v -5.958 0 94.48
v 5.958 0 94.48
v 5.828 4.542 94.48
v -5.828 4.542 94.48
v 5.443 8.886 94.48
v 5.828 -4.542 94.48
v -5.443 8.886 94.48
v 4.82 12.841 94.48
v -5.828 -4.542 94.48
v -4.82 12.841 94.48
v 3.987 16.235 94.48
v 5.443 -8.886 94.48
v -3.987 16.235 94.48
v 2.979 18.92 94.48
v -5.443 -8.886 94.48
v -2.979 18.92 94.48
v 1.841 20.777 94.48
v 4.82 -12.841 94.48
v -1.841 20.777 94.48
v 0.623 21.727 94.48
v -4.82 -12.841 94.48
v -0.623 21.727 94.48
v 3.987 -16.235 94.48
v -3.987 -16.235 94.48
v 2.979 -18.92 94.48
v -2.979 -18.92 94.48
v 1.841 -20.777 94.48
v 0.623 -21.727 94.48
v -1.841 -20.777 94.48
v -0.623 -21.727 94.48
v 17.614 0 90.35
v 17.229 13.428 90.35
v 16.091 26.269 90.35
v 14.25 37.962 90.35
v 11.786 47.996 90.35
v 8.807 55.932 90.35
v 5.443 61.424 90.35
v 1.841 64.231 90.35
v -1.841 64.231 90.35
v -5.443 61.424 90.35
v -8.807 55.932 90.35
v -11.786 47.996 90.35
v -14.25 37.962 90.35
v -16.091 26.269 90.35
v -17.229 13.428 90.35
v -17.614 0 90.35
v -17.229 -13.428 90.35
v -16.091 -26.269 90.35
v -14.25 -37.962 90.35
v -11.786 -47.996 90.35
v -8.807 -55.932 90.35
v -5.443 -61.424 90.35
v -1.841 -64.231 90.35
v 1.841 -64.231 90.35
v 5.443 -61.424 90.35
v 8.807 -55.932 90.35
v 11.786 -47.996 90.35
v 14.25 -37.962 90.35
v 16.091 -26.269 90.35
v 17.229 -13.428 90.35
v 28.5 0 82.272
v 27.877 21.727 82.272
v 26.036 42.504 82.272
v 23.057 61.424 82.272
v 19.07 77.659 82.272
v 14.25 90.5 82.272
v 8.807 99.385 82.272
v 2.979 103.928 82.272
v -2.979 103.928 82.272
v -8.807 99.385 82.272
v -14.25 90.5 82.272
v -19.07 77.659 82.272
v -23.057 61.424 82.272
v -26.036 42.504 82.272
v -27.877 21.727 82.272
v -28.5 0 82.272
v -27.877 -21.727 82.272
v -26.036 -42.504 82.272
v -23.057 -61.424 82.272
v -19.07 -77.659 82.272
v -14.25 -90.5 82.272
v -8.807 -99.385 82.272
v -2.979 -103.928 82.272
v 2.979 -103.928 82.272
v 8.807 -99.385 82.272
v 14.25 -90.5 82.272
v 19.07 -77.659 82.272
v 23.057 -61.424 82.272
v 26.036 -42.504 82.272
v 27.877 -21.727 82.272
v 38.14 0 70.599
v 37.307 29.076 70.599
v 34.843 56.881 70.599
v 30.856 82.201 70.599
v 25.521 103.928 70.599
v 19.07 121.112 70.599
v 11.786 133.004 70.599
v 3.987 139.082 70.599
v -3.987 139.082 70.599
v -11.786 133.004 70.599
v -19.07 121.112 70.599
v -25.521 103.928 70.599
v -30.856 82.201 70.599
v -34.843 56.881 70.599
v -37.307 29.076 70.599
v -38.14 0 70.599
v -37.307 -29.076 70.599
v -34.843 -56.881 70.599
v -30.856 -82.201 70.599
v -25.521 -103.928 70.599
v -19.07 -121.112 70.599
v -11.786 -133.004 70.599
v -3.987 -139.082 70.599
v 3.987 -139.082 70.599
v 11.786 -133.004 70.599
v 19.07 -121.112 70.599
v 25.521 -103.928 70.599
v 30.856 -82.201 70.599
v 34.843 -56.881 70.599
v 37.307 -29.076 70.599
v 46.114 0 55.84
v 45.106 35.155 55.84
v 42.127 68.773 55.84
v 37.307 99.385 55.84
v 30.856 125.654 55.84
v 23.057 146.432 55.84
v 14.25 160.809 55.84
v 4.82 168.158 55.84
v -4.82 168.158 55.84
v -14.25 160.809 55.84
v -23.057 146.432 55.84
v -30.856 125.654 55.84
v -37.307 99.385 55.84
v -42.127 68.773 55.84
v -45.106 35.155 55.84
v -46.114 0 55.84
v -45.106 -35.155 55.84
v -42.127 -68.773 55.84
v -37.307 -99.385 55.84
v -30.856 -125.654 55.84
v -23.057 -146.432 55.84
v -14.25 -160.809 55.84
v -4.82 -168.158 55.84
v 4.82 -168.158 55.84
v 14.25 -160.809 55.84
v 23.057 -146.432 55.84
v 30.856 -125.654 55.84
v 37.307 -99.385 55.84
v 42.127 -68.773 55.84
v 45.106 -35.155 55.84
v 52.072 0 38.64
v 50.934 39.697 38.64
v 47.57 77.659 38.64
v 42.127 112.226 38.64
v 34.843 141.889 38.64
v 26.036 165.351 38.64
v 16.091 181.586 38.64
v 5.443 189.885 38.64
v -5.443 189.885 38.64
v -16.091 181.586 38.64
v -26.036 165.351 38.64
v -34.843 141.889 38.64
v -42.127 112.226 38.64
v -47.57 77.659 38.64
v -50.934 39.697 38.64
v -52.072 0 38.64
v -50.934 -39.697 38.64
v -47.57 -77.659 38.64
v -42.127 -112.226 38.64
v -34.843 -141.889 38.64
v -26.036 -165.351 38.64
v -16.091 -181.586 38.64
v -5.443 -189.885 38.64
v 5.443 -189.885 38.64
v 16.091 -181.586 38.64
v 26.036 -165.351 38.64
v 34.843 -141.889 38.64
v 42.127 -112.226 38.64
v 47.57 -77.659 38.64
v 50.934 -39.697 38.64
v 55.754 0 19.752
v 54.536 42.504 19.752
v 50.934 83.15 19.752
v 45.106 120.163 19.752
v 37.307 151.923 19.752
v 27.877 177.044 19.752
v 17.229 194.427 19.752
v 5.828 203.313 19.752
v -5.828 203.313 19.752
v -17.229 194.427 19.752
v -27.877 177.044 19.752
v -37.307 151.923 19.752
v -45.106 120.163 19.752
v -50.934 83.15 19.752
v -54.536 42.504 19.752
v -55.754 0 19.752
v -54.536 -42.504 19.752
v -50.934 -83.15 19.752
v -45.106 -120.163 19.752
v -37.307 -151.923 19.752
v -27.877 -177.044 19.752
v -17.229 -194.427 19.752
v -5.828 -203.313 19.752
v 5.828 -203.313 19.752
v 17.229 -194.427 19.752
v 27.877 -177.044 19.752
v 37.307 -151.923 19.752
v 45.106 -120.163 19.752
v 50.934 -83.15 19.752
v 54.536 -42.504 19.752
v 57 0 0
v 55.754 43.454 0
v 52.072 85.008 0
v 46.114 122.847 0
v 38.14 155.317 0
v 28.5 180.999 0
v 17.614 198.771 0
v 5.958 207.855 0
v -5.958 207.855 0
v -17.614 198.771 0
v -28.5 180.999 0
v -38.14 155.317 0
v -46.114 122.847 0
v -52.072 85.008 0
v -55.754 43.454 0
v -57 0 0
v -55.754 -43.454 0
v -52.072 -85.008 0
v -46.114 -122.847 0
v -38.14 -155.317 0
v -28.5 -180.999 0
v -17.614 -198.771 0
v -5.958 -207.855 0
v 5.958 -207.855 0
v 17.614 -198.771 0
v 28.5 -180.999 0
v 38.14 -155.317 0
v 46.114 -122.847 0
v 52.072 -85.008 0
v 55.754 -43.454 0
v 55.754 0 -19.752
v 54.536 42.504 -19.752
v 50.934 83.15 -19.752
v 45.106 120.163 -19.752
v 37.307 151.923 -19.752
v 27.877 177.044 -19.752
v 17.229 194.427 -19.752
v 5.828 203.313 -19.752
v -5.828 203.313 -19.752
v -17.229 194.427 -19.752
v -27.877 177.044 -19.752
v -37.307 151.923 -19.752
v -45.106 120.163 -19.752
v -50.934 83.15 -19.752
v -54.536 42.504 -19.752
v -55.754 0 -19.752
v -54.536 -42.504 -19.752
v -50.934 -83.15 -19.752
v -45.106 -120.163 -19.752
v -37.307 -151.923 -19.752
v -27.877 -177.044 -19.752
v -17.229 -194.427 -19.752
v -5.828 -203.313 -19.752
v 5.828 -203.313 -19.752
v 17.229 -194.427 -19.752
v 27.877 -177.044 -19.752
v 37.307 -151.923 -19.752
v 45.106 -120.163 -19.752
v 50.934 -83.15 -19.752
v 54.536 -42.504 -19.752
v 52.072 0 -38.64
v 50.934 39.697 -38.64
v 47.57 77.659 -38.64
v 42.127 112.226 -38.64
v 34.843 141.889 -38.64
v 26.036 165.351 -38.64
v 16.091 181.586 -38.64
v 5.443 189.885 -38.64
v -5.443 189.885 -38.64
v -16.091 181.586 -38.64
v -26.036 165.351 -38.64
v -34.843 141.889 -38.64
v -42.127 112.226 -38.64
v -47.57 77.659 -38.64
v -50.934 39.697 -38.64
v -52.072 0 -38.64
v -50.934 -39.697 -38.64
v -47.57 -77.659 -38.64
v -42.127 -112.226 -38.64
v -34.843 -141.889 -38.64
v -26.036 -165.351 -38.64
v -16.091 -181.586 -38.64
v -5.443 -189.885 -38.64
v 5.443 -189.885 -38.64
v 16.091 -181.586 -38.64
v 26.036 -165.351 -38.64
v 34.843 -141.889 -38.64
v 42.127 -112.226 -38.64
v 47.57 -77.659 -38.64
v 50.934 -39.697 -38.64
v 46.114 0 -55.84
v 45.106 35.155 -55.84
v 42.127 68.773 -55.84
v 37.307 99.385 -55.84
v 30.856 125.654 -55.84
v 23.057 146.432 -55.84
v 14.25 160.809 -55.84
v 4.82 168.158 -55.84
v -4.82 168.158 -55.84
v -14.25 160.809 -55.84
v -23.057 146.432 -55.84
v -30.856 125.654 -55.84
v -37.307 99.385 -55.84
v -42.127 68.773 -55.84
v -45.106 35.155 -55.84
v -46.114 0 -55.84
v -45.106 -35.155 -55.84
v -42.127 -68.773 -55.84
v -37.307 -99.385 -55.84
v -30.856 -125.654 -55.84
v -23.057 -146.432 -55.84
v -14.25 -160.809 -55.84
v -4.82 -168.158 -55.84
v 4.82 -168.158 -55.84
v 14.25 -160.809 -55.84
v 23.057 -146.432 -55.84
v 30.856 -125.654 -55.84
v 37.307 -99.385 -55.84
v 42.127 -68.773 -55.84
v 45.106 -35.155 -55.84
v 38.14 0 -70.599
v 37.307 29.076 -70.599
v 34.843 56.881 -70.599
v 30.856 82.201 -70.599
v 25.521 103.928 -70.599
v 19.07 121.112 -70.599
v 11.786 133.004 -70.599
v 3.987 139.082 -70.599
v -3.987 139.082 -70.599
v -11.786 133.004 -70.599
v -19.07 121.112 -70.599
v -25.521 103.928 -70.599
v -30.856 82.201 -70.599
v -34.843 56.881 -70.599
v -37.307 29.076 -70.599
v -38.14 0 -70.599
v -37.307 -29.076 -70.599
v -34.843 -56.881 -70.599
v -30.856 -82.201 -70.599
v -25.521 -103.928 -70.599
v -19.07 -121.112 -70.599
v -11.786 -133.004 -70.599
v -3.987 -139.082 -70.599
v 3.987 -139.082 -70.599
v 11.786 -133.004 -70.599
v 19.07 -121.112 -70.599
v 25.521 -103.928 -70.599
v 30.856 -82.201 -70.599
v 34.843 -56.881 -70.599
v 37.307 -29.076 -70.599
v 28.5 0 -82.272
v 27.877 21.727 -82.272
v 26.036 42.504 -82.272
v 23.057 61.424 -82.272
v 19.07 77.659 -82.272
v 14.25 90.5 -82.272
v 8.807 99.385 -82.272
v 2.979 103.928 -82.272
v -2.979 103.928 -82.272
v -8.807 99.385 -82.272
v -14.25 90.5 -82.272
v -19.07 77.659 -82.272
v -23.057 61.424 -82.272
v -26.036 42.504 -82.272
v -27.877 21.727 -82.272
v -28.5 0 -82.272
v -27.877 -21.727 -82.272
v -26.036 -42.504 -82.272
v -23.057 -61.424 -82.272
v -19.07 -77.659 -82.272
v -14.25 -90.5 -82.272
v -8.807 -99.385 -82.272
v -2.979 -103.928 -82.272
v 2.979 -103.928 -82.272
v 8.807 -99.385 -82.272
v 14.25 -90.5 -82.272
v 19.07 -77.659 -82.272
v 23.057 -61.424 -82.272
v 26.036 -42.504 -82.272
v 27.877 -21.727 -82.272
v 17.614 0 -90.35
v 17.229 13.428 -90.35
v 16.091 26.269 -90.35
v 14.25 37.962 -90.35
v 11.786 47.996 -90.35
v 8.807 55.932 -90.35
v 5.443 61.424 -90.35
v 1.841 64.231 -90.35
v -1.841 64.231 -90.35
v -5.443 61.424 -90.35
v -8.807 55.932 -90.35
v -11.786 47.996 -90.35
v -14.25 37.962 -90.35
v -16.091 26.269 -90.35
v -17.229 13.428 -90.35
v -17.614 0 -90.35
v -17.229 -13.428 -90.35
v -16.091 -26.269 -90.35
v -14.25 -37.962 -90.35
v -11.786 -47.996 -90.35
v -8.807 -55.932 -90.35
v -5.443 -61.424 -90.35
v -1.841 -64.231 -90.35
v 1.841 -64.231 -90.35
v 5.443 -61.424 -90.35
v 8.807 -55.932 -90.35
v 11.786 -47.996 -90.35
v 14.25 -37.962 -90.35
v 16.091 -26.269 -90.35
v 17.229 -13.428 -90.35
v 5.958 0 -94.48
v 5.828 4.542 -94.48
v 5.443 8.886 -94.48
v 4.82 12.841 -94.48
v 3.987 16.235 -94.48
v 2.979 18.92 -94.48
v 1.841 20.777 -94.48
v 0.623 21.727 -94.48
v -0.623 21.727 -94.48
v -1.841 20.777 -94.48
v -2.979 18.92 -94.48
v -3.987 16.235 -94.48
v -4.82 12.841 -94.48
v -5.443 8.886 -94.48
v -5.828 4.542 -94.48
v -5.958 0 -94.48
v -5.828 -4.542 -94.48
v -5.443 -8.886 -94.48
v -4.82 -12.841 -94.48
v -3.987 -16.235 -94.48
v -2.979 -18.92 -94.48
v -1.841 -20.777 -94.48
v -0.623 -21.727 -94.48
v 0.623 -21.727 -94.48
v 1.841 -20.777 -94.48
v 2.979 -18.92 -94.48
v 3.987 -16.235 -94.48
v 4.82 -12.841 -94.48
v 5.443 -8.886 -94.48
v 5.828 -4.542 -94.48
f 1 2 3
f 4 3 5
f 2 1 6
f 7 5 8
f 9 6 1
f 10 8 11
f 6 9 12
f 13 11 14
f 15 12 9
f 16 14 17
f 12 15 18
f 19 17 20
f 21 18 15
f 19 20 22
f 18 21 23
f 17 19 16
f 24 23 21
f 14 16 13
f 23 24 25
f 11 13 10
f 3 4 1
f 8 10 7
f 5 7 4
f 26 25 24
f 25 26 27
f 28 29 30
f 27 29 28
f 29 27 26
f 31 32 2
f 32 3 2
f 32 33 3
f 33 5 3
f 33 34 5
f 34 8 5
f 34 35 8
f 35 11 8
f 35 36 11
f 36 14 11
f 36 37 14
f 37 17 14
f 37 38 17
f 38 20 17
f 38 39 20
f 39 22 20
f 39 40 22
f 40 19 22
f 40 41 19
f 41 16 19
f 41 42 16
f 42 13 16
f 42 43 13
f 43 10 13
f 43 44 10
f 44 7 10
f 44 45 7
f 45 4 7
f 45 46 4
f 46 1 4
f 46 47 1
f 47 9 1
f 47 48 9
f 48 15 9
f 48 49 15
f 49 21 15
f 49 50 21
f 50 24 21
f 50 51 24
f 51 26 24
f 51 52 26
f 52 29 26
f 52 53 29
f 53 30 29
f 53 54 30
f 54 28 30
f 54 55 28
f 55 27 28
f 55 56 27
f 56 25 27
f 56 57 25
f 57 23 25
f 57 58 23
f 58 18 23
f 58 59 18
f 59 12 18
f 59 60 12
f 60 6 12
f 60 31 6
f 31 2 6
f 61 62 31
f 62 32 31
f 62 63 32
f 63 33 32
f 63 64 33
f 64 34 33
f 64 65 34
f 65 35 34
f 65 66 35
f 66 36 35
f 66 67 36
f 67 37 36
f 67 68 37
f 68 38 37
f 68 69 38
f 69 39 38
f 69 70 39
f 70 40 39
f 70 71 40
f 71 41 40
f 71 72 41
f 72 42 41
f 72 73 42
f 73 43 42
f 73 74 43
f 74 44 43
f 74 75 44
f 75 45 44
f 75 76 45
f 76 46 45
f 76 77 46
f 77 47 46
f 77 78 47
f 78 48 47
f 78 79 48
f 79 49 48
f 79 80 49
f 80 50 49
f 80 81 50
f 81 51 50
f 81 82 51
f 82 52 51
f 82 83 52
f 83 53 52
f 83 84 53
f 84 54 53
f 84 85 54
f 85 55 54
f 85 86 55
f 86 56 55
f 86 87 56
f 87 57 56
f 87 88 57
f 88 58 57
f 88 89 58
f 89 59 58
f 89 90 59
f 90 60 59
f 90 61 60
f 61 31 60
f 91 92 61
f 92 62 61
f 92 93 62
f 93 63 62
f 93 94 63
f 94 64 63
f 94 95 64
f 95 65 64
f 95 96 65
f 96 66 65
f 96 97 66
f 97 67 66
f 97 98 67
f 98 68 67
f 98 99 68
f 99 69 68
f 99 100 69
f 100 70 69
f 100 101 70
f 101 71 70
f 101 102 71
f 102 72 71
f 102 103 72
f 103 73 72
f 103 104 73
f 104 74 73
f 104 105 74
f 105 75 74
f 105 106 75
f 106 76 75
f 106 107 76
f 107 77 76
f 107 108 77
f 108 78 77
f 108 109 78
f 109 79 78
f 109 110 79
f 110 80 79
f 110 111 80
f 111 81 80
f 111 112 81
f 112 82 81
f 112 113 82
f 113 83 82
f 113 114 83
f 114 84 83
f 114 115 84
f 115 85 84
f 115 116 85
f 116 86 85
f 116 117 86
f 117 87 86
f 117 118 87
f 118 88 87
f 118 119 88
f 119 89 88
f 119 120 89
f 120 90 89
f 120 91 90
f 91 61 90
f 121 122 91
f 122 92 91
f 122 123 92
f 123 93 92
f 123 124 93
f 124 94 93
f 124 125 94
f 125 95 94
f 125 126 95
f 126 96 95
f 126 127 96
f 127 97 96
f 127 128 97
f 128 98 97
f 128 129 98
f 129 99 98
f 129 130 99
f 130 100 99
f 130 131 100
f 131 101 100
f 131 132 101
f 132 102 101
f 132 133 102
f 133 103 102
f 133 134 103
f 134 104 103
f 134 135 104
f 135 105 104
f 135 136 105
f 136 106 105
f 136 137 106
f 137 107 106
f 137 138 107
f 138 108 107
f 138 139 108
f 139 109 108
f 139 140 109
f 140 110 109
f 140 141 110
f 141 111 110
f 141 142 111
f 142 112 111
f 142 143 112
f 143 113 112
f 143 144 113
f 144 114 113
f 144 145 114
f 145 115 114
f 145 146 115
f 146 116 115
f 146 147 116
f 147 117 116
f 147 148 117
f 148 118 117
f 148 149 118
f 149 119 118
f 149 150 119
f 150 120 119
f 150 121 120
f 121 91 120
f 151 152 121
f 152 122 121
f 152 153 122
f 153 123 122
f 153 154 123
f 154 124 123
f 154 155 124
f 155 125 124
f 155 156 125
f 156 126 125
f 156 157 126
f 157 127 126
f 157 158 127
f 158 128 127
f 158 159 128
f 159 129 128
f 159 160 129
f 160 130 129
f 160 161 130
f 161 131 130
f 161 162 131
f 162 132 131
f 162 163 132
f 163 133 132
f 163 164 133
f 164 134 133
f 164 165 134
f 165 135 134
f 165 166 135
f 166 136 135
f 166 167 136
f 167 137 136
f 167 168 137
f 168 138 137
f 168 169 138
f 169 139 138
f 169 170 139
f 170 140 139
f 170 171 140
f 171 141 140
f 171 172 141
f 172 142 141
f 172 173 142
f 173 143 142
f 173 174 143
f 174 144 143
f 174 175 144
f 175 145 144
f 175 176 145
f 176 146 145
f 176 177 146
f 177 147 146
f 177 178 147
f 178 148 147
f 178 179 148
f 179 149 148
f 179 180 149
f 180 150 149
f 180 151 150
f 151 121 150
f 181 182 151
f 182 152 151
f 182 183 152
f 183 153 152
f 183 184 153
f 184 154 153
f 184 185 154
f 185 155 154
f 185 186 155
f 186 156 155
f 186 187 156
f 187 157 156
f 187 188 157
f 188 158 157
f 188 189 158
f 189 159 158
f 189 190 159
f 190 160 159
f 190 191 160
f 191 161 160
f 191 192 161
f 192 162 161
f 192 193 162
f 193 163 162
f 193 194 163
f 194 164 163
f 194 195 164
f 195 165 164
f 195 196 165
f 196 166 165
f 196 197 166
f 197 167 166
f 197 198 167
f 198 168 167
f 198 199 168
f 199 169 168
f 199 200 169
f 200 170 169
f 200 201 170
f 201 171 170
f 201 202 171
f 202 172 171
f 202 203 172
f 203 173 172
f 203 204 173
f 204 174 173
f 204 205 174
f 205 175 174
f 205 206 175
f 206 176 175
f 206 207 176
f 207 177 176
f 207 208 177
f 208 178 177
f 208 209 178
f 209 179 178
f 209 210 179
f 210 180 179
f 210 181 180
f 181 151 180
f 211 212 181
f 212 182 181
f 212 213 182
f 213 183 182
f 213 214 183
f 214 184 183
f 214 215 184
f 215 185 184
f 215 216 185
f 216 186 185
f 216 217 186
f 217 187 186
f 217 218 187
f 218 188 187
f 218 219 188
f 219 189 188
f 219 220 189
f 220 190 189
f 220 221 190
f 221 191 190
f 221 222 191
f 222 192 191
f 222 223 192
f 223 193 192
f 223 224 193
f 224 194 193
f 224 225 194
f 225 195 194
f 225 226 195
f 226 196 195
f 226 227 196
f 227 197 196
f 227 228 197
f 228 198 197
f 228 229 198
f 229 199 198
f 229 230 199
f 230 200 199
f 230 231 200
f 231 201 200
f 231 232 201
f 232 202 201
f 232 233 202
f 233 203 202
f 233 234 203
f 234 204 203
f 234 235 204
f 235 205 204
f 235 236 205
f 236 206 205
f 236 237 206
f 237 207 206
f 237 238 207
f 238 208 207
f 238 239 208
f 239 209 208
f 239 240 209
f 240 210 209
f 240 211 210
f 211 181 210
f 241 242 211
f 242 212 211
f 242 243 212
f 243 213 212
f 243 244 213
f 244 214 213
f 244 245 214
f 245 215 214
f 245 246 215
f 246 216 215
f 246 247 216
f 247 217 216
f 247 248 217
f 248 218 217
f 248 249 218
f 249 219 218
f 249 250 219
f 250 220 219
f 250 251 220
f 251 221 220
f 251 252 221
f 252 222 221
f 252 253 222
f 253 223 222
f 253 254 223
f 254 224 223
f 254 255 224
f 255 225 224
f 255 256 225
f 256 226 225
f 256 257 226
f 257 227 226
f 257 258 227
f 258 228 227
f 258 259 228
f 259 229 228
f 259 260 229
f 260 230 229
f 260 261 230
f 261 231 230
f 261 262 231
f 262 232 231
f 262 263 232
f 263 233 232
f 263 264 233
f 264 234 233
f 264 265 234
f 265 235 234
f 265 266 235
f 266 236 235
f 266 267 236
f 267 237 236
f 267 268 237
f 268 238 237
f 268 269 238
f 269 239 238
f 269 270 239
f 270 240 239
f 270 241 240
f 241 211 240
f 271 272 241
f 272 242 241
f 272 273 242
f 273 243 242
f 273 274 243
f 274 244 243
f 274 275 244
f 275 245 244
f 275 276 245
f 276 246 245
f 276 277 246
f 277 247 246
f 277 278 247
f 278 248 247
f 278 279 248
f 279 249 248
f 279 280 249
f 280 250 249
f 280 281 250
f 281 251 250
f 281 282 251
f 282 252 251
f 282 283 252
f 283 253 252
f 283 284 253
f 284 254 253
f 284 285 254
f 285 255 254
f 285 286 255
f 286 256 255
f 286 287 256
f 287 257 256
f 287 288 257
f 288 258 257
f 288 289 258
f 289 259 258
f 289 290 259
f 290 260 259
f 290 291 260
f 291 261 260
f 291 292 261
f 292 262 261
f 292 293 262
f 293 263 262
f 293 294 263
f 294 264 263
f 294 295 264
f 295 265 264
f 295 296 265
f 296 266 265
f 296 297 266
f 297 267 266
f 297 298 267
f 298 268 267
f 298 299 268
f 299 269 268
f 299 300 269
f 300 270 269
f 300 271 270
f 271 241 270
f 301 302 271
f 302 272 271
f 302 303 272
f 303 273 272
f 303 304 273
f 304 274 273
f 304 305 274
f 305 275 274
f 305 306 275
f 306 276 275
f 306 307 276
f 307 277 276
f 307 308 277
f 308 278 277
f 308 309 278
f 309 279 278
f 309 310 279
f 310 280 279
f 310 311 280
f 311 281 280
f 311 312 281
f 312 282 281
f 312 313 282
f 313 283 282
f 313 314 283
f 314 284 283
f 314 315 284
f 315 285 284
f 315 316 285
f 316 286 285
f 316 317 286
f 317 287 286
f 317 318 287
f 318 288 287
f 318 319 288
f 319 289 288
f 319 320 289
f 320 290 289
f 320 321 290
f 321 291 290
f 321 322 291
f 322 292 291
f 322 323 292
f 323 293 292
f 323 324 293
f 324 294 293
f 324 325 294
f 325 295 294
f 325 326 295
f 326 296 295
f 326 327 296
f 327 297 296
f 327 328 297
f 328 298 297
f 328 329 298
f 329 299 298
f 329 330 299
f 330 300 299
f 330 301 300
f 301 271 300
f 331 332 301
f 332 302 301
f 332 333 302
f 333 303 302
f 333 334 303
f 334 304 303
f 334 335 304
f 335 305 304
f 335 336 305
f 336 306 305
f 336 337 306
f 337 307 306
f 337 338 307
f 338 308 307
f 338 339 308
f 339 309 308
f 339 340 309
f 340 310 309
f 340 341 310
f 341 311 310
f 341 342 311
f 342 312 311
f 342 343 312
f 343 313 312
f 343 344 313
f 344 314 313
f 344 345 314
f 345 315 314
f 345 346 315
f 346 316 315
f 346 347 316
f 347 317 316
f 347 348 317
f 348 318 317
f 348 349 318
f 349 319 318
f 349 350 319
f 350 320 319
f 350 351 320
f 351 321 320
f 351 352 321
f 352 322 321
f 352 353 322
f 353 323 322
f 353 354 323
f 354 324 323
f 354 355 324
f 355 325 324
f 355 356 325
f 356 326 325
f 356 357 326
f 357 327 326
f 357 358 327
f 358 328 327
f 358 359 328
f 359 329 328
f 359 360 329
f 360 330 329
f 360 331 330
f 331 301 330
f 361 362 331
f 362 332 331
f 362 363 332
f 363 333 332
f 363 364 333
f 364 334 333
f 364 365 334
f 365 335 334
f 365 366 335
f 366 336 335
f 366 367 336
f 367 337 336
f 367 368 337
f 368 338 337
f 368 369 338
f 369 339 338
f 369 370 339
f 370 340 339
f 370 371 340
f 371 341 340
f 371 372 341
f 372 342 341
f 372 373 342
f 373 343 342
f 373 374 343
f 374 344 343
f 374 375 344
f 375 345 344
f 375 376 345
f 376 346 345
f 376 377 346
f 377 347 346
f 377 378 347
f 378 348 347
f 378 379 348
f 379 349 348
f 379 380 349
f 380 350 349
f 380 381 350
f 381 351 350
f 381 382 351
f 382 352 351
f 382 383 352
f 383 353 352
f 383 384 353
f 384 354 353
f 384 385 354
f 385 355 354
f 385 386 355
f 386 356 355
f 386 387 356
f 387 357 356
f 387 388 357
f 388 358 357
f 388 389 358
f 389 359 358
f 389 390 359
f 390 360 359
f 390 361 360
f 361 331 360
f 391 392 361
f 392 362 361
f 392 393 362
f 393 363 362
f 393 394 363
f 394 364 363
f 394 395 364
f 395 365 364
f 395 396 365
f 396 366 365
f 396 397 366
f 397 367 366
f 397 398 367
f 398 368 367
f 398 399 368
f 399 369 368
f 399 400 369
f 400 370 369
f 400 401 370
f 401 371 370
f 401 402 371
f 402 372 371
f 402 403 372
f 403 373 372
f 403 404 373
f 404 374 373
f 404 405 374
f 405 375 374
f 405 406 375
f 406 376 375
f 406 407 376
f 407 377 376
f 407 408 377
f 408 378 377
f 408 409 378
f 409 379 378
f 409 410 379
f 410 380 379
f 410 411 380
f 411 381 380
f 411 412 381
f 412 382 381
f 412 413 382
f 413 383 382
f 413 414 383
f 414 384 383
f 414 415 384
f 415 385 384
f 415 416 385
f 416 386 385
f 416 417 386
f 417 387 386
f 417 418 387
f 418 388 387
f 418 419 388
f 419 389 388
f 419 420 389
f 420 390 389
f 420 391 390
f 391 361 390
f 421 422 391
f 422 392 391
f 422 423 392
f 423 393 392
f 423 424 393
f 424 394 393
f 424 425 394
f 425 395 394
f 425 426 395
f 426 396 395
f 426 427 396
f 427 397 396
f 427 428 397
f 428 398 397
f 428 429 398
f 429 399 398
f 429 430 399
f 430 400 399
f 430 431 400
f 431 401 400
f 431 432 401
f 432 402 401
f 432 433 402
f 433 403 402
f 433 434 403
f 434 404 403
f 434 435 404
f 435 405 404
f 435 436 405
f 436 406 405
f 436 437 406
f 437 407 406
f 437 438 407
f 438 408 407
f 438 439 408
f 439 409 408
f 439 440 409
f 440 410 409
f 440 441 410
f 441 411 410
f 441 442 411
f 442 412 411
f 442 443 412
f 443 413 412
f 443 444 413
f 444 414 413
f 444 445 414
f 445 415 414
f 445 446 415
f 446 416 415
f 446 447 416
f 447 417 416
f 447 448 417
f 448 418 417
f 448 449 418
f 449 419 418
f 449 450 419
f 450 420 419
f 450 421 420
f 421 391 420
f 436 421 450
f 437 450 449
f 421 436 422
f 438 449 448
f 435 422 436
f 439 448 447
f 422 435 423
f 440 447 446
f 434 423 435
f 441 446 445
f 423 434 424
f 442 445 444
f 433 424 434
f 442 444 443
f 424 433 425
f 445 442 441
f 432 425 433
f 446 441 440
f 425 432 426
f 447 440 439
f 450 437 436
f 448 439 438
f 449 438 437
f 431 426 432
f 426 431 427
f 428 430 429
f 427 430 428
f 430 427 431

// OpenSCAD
// Generated by SolidPython 1.0.1 on 2020-07-29 00:46:45


scale(v = [3, 11, 5]) {
	sphere(r = 19);
}
/***********************************************
*********      SolidPython code:      **********
************************************************
 
# import packages: SolidPython
from solid import *
from solid.utils import *
from itertools import chain, combinations, permutations


class Resize:

    def __init__(self, scad_file):
        self.scad_file = scad_file
        #self.scad_file = import_scad(scad_file)
        # cone/cylinder param:
        self.r1 = 0
        self.r2 = 0
        self.h = 0
        # rectangular prism param:
        self.w = 0
        self.l = 0
        # ellipse param:
        self.r = 0

    # import OpenScad code (file name corresponds to shape)


    # classify shape + parameters
    def assign(self, param1, param2, param3):
        if self.scad_file == 'cone.scad':
            self.r1 = param1
            self.r2 = param2
            self.h = param3
        elif self.scad_file == 'cylinder.scad':
            self.r1 = param1
            self.r2 = param2
            self.h = param3
        elif self.scad_file == 'rectangularPrism.scad':
            self.h = param1
            self.l = param2
            self.w = param3
        else:
            self.r = param1
            self.h = param2

    # resize parameters
    def iterate(self):
        x = range(3, 20, 2)
        i = 1
        if self.scad_file == 'cone.scad':
            tempList = list(permutations(x, 2))
            for temp in tempList:
                param1 = temp[0]
                param2 = temp[1]
                filepath = 'produced_scad_files/' + 'cone' + str(param1) + '_' + str(param2) + '_' + '.scad'
                scad_render_to_file(cylinder(h=param1, r1=param2, r2=0), filepath)

        elif self.scad_file == 'cylinder.scad':
            tempList = list(permutations(x, 3))
            for temp in tempList:
                param1 = temp[0]
                param2 = temp[1]
                filepath = 'produced_scad_files/' + 'cylinder' + str(param1) + '_' + str(param2) + '_' + '.scad'
                scad_render_to_file(cylinder(h=param1, r1=param2, r2=param2), filepath)

        elif self.scad_file == 'rectangularPrism.scad':
            tempList = list(permutations(x, 3))
            for temp in tempList:
                param1 = temp[0]
                param2 = temp[1]
                param3 = temp[2]
                filepath = 'produced_scad_files/' + 'rectangularPrism' + str(param1) + '_' + str(param2) + '_' + str(
                    param3) + '.scad'
                scad_render_to_file(cube(size=(param1, param2, param3)), filepath)

        elif self.scad_file == 'ellipse.scad':
            tempList = list(permutations(x, 4))
            for temp in tempList:
                param1 = temp[0]
                param2 = temp[1]
                param3 = temp[2]
                param4 = temp[3]
                filepath = 'produced_scad_files/' + 'ellipse' + str(param1) + '_' + str(param2) + '_' + str(param3) + '_' + str(param4) + '.scad'
                scad_render_to_file(scale([param1, param2, param3])(sphere(r=param4)), filepath)

    def render_to_scadfile(self):
        scad_render_to_file(scad, 'example.scad') 
 
************************************************/
